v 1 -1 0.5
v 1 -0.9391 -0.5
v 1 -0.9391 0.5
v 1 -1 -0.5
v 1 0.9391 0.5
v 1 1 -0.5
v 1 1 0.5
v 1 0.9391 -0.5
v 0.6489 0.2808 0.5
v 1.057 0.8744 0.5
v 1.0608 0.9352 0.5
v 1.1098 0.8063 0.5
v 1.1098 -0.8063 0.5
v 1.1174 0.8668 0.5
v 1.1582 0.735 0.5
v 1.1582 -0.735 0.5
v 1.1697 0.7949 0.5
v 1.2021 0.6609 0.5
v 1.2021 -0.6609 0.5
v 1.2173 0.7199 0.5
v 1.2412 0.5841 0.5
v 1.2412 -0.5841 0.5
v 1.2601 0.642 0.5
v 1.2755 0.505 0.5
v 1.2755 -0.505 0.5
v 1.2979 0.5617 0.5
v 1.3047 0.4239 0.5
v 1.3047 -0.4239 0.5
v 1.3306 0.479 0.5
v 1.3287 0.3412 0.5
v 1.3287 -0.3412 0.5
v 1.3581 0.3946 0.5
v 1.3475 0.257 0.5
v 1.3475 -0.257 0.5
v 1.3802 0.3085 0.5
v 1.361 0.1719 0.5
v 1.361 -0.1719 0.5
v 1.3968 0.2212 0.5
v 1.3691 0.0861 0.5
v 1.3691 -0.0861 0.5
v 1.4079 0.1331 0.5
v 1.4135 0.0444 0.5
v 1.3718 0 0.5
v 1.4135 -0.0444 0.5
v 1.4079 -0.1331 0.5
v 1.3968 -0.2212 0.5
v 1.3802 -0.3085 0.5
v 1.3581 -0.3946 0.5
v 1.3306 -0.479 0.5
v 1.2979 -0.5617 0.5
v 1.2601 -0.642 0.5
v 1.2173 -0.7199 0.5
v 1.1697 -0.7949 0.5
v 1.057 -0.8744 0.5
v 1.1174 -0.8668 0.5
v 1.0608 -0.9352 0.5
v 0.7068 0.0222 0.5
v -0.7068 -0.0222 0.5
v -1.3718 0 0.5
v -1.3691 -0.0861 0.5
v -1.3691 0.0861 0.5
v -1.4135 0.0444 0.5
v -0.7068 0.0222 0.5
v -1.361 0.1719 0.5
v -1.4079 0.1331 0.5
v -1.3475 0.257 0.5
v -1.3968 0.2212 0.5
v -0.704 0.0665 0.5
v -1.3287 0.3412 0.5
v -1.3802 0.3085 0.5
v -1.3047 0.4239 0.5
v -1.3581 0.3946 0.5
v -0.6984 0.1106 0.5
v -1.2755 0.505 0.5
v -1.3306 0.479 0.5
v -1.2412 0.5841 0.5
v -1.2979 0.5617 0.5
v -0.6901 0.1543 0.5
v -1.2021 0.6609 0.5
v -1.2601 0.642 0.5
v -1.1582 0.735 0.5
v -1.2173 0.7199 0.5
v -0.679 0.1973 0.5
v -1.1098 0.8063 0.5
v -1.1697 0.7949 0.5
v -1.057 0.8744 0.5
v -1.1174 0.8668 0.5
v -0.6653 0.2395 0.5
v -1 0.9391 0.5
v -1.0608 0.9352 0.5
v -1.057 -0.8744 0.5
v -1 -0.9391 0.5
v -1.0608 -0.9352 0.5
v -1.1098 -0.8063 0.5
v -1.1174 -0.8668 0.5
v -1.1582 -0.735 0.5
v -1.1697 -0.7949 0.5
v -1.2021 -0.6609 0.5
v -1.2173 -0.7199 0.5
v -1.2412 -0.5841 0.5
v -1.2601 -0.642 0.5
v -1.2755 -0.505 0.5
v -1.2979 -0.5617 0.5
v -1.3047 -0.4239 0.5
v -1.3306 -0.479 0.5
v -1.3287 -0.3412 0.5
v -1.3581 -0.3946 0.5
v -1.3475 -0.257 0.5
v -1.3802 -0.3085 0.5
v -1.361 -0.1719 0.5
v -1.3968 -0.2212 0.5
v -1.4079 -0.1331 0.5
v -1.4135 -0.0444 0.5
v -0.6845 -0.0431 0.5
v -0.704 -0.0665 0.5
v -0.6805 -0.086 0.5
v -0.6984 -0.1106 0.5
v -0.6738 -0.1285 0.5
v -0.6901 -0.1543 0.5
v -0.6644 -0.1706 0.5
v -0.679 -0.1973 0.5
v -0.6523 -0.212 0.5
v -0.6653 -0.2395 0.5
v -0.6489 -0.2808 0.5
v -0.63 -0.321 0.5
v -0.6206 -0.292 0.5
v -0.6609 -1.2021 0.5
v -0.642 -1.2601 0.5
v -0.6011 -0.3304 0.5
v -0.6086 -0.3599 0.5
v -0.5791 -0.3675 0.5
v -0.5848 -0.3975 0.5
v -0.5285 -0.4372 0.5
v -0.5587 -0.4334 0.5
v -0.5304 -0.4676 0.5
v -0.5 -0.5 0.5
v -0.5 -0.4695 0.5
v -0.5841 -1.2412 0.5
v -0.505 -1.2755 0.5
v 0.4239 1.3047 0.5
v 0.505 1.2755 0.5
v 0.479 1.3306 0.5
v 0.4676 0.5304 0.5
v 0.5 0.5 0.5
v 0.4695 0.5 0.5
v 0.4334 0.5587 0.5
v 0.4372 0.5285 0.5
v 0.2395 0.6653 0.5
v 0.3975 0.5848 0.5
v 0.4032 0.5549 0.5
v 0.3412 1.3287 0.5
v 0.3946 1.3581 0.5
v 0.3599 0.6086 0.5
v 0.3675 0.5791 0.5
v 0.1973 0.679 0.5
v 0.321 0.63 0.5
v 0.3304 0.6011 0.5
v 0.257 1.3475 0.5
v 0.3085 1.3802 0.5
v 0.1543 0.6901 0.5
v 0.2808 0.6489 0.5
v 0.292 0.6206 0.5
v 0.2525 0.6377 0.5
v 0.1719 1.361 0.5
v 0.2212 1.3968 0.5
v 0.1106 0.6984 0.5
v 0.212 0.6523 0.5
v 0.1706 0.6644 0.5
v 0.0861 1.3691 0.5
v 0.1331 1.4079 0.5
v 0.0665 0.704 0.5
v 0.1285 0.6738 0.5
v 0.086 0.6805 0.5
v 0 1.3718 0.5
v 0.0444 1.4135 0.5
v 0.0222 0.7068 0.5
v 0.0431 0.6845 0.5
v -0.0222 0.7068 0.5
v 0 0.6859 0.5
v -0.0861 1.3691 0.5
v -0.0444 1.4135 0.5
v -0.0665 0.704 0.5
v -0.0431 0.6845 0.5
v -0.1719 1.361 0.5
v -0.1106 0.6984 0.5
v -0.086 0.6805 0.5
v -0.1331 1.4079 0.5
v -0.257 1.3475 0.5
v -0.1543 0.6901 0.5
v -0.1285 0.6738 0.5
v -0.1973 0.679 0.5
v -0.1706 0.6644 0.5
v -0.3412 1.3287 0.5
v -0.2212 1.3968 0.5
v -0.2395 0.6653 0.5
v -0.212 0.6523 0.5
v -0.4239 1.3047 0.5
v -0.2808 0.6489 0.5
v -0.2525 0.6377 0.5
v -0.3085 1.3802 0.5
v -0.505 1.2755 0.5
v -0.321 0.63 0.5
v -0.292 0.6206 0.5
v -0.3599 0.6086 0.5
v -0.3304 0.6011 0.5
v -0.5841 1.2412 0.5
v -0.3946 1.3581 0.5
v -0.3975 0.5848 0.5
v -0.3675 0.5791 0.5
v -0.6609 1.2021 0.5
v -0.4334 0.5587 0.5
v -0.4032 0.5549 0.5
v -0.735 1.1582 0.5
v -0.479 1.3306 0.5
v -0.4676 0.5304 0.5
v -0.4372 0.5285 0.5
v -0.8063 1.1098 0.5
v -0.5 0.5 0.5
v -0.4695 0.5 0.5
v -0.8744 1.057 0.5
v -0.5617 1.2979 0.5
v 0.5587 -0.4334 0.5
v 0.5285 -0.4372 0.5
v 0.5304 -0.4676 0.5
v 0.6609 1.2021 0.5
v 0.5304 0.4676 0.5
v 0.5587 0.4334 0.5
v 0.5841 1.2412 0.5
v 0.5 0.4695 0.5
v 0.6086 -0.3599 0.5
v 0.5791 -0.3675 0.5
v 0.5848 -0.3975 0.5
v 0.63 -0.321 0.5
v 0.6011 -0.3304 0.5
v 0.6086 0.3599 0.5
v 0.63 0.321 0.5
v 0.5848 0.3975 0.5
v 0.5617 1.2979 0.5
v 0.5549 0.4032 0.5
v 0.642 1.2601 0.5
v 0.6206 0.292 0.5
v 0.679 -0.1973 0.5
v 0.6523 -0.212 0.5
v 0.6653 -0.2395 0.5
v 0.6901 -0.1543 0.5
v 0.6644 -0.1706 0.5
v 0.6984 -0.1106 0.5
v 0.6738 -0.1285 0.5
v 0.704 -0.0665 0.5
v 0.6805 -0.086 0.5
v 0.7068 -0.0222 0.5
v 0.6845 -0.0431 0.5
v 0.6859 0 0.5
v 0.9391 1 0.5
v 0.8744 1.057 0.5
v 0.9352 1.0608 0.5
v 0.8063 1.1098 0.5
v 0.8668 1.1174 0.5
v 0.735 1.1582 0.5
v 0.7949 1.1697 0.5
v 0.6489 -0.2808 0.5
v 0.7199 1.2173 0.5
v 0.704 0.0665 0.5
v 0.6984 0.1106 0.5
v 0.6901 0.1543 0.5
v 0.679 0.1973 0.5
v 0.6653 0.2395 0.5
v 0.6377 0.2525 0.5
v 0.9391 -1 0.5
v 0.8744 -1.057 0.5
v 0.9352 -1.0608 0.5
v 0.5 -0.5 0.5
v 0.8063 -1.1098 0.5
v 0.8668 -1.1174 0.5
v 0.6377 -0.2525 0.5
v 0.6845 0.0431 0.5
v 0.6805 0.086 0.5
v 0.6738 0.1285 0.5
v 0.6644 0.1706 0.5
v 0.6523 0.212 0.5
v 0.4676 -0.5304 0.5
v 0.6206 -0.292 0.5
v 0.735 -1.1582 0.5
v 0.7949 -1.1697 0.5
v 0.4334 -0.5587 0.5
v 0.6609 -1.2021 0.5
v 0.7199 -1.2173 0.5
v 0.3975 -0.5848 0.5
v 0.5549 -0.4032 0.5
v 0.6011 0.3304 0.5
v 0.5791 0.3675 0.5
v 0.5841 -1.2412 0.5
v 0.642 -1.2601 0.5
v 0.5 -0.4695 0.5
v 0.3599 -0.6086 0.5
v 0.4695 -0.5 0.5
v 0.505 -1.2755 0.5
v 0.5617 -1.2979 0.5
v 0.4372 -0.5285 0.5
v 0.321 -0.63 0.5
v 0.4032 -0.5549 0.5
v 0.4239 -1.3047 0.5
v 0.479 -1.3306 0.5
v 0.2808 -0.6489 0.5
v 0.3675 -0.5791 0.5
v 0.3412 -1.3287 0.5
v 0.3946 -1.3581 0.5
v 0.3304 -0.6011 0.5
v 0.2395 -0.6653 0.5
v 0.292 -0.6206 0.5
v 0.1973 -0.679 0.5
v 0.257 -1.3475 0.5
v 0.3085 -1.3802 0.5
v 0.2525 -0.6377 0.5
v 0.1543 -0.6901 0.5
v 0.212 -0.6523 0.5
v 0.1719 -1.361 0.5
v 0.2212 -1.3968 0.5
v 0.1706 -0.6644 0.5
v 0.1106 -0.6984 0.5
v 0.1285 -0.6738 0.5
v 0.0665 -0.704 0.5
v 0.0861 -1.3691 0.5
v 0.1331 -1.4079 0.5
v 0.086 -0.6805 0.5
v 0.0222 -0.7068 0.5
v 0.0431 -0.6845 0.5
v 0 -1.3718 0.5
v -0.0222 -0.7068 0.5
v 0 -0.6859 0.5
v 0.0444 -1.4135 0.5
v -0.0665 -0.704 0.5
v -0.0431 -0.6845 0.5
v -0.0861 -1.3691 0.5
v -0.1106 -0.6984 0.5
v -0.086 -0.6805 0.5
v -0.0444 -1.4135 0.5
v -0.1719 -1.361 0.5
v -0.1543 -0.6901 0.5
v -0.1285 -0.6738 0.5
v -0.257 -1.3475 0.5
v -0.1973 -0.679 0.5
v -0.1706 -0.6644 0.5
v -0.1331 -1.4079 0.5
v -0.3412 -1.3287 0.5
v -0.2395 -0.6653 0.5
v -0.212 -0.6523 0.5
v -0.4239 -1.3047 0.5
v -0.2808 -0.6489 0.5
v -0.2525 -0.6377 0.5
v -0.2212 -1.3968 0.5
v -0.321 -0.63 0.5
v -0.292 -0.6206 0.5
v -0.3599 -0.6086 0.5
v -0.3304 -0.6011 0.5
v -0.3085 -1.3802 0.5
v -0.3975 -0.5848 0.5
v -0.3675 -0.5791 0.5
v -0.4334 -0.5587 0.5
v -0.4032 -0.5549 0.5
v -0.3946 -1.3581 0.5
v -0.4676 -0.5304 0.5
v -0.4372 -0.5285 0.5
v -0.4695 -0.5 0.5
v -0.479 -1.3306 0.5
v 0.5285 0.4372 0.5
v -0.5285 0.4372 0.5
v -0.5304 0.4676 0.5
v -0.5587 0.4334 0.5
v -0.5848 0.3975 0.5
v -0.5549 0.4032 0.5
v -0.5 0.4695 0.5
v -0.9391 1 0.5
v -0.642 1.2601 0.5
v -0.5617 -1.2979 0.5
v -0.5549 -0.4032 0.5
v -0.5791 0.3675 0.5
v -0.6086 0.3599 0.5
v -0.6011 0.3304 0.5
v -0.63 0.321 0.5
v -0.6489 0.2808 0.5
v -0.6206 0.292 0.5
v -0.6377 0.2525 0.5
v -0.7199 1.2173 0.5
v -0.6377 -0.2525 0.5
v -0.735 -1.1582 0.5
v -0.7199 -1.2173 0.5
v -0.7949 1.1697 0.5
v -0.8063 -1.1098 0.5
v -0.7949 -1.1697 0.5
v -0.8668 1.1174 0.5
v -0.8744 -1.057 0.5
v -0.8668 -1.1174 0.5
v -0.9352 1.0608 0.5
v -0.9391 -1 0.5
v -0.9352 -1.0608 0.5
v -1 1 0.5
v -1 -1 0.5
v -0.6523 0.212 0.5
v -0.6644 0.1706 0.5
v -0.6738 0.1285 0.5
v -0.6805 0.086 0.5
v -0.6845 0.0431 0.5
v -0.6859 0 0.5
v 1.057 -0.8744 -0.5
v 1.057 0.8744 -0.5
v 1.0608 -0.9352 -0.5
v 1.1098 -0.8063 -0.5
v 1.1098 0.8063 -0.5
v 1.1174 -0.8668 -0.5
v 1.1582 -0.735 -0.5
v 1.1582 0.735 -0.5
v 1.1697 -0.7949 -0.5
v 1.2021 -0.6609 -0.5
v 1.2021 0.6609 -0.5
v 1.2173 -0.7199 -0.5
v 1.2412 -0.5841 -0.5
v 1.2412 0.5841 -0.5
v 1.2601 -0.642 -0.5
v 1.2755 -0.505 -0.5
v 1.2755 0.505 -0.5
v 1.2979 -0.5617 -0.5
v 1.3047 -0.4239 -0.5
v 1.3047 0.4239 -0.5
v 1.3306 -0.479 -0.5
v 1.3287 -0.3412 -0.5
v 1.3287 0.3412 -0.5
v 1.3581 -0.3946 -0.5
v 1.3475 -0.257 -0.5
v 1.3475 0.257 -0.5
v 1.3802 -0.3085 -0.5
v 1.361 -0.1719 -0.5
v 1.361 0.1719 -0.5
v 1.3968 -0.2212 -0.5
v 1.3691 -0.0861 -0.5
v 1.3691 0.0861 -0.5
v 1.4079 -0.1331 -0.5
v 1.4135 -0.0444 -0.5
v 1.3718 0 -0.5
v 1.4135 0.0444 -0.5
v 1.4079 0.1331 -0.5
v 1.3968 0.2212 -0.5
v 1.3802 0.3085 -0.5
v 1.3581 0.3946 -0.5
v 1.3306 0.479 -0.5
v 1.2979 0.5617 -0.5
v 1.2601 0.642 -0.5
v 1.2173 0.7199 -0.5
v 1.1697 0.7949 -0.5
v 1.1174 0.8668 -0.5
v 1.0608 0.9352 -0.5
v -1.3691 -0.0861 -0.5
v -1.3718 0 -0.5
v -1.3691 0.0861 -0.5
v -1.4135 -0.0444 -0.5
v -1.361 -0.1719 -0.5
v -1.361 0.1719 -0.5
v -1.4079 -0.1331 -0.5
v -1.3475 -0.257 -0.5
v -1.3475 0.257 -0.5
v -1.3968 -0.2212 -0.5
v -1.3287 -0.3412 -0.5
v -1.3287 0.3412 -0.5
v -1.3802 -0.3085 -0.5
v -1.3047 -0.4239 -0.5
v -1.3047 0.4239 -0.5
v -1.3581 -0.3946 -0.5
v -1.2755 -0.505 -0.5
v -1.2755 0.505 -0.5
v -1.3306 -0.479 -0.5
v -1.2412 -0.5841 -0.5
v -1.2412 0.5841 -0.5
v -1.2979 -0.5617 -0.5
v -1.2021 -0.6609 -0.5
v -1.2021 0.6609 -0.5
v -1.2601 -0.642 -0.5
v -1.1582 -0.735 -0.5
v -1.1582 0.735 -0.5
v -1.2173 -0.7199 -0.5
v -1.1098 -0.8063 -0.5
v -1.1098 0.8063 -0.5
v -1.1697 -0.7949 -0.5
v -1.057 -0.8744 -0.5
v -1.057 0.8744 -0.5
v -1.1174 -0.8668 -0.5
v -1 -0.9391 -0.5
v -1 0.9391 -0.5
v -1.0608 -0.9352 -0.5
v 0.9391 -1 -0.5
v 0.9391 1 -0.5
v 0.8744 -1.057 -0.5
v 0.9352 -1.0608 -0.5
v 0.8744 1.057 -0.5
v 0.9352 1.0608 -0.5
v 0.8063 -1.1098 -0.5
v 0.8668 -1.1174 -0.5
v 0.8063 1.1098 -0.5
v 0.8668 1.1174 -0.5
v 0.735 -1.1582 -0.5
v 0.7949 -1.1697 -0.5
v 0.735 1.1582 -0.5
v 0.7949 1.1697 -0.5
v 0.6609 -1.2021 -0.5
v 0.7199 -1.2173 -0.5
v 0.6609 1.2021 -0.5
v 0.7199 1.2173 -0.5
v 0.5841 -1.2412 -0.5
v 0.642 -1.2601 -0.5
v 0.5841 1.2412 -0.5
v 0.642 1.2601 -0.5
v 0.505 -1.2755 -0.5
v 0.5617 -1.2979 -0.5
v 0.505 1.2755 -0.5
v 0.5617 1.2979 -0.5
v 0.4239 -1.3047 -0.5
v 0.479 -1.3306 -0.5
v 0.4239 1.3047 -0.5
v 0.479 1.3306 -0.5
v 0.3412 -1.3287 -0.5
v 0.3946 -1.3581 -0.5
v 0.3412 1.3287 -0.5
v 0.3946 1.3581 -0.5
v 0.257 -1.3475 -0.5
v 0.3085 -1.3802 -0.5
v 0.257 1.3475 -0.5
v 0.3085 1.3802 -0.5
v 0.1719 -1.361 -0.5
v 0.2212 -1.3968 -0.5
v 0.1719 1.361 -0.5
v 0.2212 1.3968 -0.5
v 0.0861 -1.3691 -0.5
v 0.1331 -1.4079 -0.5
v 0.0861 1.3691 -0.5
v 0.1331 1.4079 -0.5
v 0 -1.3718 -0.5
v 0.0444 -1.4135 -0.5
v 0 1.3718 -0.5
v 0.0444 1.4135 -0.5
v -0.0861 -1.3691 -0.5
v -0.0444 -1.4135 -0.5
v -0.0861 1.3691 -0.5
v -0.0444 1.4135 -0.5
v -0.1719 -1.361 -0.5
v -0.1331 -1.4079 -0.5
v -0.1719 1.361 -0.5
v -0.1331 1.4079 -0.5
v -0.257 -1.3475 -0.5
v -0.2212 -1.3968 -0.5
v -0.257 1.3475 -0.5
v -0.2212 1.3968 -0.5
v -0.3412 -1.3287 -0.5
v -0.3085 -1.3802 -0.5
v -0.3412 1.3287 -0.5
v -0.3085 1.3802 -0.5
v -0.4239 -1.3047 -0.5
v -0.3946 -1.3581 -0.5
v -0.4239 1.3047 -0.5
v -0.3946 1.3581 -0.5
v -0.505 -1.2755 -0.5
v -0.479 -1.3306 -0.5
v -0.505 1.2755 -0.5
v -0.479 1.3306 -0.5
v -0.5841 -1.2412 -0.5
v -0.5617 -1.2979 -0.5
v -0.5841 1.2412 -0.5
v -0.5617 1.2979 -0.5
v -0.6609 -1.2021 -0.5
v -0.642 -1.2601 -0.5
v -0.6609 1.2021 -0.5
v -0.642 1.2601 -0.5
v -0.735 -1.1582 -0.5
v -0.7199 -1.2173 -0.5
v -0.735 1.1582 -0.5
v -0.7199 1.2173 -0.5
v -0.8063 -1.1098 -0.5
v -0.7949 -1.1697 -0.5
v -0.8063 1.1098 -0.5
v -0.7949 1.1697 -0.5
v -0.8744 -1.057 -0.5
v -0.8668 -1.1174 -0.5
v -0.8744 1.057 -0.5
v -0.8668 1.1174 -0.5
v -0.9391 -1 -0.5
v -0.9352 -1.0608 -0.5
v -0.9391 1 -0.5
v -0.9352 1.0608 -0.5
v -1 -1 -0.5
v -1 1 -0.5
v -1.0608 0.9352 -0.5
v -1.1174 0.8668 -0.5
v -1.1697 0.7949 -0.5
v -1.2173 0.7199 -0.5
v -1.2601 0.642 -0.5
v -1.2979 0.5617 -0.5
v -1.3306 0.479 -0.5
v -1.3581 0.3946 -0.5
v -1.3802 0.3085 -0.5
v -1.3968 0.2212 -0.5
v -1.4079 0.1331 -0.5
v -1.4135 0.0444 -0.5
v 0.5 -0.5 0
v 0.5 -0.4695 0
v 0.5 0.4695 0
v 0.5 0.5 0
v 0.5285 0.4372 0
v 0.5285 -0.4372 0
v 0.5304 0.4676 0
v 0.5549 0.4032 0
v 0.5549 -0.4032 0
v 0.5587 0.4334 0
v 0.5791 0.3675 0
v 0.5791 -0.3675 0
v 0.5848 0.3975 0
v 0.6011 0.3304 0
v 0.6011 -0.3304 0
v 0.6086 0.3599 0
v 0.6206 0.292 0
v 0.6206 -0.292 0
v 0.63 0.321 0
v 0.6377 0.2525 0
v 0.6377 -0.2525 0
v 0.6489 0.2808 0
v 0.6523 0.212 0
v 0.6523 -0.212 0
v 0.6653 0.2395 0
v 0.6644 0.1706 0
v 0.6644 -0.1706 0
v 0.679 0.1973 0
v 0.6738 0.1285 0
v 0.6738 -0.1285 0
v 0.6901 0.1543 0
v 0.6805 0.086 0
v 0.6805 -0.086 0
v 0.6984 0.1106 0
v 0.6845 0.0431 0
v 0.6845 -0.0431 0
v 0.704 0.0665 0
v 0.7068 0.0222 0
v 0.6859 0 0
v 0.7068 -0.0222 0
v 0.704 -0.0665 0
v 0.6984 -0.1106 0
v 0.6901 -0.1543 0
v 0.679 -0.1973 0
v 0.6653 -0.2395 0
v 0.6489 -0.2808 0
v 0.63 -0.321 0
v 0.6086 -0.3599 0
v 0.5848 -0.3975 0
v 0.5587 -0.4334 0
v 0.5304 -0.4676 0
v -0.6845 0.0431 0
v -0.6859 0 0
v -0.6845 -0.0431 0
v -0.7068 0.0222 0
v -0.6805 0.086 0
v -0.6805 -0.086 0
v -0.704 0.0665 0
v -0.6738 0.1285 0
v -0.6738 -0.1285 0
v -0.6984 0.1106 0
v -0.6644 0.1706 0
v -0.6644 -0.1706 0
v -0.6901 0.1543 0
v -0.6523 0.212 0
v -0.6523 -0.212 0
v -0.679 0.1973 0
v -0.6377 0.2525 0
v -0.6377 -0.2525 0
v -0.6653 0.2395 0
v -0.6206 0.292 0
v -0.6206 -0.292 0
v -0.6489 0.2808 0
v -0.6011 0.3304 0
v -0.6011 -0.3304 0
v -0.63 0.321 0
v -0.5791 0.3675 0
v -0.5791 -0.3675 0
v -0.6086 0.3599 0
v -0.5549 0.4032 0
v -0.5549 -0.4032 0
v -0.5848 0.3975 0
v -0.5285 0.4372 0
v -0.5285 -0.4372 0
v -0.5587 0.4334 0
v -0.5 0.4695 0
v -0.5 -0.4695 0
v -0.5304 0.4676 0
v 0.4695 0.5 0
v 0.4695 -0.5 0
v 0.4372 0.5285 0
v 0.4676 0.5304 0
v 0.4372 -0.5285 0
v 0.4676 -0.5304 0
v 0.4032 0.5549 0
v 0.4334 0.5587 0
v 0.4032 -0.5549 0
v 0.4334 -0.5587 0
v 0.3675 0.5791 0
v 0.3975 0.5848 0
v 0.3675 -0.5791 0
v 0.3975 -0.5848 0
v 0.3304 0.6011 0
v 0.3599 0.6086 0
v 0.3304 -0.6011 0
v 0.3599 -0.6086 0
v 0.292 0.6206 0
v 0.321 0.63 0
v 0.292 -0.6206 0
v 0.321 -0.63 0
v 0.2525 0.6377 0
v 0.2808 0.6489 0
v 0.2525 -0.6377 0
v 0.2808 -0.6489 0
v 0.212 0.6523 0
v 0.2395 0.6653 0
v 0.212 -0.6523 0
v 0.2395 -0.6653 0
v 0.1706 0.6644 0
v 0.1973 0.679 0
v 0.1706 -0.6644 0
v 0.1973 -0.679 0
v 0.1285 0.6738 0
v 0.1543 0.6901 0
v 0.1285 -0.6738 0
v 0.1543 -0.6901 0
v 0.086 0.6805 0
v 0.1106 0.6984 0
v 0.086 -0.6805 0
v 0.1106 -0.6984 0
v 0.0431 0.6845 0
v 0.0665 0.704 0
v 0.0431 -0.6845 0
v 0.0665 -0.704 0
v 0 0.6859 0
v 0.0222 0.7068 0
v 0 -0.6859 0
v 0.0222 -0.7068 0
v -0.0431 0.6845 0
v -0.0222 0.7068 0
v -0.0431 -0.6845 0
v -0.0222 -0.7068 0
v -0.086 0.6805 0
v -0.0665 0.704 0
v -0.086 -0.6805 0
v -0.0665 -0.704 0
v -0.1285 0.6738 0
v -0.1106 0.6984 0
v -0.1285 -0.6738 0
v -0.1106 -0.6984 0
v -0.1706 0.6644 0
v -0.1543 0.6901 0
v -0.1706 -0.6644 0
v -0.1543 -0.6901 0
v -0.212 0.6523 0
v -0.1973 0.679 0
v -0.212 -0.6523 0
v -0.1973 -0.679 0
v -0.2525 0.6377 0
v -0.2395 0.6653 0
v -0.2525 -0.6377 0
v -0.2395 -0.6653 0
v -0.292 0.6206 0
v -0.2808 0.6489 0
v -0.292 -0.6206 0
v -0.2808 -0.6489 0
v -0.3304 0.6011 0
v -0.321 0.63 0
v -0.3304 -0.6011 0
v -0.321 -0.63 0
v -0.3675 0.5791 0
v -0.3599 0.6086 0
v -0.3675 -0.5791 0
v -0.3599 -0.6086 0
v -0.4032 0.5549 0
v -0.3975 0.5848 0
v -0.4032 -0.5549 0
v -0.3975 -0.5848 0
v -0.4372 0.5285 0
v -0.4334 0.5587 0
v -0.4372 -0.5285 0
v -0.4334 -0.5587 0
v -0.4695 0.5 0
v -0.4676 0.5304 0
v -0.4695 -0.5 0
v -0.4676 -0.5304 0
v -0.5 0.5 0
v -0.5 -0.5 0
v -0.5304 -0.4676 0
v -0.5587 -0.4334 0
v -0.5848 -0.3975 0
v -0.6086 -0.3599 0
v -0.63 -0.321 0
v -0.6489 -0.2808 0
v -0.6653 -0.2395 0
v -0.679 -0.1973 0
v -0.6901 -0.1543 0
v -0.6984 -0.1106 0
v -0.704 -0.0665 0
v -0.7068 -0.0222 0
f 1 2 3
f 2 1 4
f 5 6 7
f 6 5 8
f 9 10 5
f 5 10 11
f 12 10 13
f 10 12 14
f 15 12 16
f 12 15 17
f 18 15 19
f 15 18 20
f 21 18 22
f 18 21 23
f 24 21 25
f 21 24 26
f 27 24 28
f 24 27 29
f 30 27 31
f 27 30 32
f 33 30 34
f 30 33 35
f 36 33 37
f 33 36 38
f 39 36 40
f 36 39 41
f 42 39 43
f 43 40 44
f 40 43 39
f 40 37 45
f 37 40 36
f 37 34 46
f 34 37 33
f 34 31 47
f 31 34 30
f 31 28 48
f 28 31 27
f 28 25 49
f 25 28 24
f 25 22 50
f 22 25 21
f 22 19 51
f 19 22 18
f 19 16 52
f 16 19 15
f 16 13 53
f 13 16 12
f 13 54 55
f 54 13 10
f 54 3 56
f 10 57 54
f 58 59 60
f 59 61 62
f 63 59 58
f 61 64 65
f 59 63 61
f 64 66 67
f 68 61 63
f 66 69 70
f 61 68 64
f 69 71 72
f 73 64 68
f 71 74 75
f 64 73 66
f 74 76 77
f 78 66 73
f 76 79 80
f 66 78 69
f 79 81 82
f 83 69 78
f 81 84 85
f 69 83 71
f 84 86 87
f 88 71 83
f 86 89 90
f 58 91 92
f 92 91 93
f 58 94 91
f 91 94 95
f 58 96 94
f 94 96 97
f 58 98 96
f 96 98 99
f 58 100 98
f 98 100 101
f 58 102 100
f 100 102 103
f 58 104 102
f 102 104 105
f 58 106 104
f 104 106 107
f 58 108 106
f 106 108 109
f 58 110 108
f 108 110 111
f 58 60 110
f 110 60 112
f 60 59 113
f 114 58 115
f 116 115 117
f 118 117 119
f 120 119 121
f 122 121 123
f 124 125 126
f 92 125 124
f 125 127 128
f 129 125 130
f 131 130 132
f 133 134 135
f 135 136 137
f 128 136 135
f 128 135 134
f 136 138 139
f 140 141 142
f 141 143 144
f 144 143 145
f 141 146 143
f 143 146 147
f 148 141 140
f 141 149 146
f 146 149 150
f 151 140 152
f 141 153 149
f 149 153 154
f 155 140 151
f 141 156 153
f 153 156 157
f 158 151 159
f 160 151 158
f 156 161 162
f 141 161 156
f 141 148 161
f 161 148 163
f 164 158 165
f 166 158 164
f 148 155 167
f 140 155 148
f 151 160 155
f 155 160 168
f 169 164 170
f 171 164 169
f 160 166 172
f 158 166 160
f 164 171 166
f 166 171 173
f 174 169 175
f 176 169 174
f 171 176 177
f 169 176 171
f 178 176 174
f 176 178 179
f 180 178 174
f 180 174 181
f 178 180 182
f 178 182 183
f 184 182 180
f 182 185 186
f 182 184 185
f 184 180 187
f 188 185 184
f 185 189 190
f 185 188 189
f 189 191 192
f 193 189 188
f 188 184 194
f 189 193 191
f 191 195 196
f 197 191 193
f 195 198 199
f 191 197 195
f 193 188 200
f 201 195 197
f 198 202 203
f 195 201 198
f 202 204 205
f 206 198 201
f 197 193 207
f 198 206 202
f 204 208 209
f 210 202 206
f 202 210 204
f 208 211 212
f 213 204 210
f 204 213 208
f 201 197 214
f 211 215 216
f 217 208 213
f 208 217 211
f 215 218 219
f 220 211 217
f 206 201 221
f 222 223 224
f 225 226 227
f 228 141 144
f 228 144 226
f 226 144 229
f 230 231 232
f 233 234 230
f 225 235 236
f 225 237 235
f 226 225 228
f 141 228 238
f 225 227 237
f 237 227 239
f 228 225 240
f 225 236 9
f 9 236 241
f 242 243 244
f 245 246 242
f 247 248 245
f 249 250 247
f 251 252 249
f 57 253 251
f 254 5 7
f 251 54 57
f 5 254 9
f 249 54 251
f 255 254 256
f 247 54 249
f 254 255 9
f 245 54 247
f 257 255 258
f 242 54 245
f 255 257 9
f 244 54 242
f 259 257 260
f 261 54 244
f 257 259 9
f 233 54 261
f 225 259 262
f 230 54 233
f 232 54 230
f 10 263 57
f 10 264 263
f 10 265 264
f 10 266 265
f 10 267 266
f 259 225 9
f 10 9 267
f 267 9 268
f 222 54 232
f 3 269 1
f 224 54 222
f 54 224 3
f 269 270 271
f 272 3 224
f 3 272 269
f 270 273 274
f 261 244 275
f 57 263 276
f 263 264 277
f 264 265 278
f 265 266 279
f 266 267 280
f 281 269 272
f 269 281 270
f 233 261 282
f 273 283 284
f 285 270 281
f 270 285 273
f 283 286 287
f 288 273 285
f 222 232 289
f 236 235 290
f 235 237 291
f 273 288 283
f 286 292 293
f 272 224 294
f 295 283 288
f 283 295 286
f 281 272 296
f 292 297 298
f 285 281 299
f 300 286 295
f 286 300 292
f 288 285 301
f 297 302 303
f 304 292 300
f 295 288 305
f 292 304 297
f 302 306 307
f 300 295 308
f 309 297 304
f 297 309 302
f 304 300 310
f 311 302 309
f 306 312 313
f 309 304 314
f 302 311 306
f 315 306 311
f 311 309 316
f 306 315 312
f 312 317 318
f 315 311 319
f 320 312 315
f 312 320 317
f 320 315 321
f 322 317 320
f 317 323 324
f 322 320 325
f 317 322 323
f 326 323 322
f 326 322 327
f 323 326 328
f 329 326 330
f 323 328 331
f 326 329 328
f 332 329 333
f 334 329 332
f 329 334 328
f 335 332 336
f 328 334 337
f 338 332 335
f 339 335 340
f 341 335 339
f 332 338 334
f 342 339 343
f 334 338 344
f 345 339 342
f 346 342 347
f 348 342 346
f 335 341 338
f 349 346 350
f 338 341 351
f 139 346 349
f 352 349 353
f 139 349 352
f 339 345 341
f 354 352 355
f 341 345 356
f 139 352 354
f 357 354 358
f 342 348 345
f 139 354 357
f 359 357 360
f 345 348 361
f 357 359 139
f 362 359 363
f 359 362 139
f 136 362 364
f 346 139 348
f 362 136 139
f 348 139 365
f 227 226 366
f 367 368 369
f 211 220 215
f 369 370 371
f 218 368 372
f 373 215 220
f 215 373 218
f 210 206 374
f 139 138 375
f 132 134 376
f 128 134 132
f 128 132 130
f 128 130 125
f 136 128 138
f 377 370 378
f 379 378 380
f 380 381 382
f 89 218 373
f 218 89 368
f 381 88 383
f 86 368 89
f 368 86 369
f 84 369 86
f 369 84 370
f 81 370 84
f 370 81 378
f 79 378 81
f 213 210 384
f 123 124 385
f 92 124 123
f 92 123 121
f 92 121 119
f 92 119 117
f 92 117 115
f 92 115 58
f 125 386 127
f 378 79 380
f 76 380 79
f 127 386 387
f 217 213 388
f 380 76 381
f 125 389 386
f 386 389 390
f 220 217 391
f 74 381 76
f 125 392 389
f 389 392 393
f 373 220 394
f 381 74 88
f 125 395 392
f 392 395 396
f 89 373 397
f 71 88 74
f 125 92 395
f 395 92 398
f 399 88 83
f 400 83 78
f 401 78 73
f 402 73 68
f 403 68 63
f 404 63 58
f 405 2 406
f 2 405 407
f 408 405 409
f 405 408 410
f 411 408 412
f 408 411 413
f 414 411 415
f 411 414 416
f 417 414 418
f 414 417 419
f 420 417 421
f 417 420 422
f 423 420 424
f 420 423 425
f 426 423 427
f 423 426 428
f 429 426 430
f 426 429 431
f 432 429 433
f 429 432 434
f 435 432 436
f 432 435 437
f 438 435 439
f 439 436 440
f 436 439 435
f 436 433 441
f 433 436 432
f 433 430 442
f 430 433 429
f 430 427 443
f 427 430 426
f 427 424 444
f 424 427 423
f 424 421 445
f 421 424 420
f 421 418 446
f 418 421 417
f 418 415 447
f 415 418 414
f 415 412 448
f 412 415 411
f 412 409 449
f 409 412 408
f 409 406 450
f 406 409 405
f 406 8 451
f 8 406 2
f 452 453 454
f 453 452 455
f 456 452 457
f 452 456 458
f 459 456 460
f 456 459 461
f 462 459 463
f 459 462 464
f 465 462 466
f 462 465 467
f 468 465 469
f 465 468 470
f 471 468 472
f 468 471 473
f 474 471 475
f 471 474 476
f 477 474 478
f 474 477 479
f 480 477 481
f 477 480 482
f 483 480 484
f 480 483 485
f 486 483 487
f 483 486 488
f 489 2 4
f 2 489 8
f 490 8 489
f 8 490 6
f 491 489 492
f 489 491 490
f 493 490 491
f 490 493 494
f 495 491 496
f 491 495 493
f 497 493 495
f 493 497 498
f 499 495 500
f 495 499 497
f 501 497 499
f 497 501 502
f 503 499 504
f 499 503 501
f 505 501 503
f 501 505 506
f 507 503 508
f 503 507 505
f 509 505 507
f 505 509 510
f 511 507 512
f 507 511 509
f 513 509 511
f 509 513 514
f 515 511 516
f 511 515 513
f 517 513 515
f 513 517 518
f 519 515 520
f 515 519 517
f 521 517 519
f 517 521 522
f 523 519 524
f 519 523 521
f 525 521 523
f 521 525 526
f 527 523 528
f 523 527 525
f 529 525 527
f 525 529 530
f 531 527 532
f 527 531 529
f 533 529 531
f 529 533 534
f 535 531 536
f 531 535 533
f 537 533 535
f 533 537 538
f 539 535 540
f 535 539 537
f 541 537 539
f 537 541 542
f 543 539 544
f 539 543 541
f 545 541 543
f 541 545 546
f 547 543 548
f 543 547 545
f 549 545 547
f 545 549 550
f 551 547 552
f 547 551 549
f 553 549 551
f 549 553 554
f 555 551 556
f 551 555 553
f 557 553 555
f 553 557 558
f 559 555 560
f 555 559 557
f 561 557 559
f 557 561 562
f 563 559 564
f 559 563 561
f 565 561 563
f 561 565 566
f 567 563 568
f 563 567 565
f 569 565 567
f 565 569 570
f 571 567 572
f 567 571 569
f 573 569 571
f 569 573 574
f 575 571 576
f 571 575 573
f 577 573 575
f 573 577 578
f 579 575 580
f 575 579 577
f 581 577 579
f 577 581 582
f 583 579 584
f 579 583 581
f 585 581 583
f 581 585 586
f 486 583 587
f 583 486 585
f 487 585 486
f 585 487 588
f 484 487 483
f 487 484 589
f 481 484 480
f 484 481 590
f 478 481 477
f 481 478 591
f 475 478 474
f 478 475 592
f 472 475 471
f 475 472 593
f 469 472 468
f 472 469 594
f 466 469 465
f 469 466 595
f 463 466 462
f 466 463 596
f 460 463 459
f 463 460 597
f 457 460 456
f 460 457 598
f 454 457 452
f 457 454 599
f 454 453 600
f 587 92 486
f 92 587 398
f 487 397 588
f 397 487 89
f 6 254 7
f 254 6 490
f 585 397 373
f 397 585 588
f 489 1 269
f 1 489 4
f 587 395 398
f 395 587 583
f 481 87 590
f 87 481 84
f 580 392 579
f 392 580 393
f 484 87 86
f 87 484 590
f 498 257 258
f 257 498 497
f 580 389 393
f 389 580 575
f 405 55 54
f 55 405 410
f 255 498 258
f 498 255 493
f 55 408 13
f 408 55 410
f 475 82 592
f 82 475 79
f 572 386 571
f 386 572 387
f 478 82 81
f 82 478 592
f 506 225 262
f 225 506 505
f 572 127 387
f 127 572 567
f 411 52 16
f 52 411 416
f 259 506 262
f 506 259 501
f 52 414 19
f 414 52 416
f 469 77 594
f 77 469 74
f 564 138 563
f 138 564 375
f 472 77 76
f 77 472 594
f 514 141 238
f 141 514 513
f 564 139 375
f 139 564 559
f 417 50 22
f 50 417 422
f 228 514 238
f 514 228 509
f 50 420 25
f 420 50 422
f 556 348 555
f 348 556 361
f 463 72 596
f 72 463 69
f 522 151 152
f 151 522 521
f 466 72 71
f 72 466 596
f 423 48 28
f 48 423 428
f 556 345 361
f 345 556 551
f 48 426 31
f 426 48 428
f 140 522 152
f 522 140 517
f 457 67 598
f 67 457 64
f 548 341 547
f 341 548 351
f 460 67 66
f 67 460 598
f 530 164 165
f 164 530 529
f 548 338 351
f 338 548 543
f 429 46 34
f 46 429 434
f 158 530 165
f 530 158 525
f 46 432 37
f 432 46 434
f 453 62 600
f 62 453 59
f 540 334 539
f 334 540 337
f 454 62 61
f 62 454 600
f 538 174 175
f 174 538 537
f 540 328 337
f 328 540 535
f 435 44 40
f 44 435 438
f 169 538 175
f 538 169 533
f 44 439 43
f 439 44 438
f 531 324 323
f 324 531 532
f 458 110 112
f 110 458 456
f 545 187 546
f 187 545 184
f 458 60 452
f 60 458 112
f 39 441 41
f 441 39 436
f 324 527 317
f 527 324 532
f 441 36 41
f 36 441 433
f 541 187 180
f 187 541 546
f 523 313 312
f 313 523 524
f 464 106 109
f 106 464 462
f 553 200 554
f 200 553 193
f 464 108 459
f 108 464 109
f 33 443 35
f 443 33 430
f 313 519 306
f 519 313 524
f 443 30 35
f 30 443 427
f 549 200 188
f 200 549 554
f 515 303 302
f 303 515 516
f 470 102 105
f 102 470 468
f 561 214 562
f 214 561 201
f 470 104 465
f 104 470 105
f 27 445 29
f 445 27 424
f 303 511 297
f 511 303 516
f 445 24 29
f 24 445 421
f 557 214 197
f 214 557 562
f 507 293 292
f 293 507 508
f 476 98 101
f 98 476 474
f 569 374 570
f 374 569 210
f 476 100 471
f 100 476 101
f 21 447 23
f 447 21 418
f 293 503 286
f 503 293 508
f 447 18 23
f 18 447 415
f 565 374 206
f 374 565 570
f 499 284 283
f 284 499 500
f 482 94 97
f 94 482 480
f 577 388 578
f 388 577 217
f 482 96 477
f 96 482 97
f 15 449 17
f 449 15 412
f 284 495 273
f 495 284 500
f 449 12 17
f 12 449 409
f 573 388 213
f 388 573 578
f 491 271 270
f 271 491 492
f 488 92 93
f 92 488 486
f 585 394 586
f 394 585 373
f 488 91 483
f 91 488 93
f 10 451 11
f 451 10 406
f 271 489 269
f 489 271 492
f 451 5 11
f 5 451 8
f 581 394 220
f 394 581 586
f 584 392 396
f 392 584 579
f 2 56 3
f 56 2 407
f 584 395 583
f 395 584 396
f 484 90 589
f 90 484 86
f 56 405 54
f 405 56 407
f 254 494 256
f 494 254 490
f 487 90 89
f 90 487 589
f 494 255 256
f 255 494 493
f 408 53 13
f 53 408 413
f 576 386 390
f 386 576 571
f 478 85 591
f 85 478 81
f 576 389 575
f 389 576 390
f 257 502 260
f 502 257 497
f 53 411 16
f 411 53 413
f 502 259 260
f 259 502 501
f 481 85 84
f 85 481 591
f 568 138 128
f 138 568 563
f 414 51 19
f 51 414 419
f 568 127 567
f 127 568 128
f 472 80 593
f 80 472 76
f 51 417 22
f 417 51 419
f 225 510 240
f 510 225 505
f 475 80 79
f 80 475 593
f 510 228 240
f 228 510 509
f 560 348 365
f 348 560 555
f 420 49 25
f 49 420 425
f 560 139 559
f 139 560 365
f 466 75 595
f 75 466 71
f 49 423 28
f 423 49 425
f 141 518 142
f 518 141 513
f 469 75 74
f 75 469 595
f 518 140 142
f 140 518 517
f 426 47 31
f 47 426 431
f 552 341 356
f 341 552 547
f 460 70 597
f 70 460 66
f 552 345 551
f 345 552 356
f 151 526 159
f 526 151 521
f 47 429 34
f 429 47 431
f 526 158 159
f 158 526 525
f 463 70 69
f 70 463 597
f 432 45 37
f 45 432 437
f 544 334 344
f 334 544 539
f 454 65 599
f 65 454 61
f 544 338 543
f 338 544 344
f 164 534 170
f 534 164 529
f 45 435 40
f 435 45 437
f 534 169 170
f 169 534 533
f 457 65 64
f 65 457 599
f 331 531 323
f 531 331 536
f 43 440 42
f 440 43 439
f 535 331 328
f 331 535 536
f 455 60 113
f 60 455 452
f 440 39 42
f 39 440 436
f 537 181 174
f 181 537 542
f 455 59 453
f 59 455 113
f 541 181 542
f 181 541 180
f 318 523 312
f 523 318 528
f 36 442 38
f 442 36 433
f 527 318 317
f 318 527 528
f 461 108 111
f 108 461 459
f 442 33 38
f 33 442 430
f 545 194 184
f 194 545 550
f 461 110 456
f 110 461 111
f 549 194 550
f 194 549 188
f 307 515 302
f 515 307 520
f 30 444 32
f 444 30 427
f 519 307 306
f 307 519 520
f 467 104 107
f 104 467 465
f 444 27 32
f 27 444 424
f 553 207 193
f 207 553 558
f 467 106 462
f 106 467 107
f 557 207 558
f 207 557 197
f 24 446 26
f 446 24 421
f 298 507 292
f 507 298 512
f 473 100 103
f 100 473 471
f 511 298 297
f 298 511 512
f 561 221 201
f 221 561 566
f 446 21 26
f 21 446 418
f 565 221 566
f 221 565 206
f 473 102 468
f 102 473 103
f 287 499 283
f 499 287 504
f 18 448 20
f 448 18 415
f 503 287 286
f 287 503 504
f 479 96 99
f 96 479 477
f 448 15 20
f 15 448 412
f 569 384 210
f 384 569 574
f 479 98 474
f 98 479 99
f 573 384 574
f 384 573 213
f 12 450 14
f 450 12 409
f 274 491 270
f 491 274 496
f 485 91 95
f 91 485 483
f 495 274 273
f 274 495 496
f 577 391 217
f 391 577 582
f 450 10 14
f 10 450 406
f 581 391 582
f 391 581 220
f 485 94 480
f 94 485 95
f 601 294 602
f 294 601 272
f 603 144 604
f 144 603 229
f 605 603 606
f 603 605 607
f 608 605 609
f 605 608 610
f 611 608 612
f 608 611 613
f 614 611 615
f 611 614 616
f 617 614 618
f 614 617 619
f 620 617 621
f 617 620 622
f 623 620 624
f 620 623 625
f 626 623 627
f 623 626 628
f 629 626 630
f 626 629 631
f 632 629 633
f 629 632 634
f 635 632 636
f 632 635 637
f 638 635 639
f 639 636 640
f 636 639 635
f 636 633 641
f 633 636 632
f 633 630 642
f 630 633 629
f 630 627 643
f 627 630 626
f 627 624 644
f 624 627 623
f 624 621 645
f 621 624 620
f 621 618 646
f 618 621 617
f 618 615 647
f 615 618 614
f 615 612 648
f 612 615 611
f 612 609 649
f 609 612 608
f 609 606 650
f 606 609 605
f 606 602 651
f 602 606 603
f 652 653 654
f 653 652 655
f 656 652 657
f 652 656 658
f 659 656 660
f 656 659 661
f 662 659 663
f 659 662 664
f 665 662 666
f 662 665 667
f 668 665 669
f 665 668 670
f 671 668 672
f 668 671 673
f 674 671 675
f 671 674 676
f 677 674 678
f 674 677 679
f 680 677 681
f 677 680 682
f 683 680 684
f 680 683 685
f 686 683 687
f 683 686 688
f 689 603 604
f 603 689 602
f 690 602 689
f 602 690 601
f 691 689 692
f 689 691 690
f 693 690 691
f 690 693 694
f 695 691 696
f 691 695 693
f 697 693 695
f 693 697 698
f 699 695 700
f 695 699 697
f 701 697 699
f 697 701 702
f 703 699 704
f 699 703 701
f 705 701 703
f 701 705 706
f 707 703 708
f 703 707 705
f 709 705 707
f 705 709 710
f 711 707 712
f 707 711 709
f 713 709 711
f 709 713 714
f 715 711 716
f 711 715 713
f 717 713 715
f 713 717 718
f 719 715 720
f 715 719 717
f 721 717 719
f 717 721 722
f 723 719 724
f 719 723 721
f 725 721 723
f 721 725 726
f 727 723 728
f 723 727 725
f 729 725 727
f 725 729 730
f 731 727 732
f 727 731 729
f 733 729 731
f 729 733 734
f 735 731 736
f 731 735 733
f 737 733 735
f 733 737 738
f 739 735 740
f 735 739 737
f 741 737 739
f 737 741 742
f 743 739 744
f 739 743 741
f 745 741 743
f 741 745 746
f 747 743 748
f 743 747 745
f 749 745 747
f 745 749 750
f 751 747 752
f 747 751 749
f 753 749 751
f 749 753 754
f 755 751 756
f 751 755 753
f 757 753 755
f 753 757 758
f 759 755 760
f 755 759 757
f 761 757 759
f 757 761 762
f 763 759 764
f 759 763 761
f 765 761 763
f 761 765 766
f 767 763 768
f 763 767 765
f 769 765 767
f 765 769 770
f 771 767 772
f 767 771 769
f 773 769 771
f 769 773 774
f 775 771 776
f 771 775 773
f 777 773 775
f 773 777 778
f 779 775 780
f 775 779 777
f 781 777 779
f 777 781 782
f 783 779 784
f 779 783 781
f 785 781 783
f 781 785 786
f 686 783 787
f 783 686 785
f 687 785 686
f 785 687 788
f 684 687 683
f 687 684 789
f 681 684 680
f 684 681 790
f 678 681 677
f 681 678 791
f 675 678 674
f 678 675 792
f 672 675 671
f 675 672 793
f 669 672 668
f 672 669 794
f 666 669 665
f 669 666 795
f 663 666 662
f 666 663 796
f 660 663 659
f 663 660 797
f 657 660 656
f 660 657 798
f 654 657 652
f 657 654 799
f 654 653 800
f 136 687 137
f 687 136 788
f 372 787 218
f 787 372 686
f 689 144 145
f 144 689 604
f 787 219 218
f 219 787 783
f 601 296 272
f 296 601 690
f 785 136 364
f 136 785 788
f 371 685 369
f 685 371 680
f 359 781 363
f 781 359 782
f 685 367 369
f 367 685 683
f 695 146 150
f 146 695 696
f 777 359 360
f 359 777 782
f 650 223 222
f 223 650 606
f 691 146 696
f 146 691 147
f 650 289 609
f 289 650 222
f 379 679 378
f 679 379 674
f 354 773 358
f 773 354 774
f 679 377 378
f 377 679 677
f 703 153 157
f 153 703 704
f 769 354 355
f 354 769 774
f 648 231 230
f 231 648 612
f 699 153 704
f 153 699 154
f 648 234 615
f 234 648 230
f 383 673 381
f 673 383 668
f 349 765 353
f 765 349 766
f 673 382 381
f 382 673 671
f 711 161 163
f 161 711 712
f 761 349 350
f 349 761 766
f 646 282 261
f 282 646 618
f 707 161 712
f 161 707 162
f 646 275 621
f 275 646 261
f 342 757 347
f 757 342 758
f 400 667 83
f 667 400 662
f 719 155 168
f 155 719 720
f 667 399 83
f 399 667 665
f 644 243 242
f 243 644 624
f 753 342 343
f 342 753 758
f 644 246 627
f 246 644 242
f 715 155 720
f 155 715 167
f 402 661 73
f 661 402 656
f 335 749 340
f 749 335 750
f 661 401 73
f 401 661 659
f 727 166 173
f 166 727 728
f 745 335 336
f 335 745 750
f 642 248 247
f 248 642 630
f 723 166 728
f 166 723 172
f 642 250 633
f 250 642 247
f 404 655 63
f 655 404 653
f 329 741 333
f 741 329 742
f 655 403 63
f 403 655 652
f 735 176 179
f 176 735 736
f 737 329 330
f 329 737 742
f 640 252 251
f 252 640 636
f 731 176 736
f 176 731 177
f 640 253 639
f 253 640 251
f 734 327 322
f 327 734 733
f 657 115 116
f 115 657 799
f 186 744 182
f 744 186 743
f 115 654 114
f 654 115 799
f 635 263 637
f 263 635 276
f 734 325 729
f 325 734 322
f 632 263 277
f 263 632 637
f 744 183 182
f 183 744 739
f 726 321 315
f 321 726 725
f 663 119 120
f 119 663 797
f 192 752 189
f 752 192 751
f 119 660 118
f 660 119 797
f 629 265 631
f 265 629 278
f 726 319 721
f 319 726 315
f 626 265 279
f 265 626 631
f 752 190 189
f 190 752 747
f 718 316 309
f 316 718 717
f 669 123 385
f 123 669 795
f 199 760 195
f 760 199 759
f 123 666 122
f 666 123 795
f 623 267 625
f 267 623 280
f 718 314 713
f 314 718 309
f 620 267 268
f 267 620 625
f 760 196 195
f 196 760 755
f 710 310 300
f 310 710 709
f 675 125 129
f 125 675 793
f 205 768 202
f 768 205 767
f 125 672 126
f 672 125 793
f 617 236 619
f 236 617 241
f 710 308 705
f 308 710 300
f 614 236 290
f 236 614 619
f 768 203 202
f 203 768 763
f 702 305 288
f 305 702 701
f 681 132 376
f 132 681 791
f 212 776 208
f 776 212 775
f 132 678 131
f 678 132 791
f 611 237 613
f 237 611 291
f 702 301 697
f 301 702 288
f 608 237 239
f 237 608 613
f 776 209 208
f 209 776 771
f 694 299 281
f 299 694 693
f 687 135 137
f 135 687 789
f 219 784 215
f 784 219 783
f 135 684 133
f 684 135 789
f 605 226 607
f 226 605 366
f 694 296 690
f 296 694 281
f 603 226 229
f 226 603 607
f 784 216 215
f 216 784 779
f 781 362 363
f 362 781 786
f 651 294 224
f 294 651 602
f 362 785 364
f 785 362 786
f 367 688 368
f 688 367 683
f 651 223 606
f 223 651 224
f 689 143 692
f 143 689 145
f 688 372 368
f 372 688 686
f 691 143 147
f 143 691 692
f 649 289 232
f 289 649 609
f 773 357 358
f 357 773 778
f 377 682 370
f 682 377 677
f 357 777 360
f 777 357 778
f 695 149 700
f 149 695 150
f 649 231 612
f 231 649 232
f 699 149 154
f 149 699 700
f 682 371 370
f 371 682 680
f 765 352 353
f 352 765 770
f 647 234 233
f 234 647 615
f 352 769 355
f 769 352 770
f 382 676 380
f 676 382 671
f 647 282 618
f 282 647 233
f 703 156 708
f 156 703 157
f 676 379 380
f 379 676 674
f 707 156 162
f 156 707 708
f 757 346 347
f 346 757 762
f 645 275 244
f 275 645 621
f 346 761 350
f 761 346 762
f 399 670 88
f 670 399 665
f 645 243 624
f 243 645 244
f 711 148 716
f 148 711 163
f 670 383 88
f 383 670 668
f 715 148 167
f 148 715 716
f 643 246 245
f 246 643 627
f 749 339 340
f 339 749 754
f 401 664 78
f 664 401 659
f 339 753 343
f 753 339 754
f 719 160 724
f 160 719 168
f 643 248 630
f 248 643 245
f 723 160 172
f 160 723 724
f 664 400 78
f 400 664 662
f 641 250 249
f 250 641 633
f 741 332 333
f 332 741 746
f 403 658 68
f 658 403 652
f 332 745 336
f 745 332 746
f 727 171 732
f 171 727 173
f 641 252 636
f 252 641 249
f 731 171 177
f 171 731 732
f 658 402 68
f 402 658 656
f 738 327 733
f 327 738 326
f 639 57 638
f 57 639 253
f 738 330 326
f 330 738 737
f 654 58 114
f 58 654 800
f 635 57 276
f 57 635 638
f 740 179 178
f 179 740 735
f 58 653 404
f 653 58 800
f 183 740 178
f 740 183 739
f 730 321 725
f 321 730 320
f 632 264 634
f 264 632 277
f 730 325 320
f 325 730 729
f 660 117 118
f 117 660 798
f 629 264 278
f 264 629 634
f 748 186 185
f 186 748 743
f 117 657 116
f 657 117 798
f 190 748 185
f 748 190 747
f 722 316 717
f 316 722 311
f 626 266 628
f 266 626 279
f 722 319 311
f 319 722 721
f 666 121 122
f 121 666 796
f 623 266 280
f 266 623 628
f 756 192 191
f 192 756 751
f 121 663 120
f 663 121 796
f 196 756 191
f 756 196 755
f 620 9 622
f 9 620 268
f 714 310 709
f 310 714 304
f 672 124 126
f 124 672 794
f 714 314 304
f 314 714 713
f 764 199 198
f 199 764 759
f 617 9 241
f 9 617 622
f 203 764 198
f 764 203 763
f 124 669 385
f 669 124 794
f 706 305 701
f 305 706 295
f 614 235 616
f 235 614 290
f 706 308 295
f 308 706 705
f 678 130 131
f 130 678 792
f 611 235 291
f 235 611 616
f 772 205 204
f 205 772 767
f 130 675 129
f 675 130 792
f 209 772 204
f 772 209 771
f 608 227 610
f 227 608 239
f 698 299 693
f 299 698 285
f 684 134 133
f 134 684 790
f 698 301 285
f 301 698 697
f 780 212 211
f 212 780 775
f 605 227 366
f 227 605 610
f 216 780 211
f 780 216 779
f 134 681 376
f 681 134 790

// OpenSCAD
module multi_rot_cube(N=10) {
   alpha=360/N;
   union() {
      for(i=[0:N-1]) {
         rotate(i*alpha)
            cube(center=true);
      }
   }
}


difference() {
   scale([2,2,1]) multi_rot_cube(N=50);
   translate([0,0,0.5]) multi_rot_cube(N=50);
}
   
